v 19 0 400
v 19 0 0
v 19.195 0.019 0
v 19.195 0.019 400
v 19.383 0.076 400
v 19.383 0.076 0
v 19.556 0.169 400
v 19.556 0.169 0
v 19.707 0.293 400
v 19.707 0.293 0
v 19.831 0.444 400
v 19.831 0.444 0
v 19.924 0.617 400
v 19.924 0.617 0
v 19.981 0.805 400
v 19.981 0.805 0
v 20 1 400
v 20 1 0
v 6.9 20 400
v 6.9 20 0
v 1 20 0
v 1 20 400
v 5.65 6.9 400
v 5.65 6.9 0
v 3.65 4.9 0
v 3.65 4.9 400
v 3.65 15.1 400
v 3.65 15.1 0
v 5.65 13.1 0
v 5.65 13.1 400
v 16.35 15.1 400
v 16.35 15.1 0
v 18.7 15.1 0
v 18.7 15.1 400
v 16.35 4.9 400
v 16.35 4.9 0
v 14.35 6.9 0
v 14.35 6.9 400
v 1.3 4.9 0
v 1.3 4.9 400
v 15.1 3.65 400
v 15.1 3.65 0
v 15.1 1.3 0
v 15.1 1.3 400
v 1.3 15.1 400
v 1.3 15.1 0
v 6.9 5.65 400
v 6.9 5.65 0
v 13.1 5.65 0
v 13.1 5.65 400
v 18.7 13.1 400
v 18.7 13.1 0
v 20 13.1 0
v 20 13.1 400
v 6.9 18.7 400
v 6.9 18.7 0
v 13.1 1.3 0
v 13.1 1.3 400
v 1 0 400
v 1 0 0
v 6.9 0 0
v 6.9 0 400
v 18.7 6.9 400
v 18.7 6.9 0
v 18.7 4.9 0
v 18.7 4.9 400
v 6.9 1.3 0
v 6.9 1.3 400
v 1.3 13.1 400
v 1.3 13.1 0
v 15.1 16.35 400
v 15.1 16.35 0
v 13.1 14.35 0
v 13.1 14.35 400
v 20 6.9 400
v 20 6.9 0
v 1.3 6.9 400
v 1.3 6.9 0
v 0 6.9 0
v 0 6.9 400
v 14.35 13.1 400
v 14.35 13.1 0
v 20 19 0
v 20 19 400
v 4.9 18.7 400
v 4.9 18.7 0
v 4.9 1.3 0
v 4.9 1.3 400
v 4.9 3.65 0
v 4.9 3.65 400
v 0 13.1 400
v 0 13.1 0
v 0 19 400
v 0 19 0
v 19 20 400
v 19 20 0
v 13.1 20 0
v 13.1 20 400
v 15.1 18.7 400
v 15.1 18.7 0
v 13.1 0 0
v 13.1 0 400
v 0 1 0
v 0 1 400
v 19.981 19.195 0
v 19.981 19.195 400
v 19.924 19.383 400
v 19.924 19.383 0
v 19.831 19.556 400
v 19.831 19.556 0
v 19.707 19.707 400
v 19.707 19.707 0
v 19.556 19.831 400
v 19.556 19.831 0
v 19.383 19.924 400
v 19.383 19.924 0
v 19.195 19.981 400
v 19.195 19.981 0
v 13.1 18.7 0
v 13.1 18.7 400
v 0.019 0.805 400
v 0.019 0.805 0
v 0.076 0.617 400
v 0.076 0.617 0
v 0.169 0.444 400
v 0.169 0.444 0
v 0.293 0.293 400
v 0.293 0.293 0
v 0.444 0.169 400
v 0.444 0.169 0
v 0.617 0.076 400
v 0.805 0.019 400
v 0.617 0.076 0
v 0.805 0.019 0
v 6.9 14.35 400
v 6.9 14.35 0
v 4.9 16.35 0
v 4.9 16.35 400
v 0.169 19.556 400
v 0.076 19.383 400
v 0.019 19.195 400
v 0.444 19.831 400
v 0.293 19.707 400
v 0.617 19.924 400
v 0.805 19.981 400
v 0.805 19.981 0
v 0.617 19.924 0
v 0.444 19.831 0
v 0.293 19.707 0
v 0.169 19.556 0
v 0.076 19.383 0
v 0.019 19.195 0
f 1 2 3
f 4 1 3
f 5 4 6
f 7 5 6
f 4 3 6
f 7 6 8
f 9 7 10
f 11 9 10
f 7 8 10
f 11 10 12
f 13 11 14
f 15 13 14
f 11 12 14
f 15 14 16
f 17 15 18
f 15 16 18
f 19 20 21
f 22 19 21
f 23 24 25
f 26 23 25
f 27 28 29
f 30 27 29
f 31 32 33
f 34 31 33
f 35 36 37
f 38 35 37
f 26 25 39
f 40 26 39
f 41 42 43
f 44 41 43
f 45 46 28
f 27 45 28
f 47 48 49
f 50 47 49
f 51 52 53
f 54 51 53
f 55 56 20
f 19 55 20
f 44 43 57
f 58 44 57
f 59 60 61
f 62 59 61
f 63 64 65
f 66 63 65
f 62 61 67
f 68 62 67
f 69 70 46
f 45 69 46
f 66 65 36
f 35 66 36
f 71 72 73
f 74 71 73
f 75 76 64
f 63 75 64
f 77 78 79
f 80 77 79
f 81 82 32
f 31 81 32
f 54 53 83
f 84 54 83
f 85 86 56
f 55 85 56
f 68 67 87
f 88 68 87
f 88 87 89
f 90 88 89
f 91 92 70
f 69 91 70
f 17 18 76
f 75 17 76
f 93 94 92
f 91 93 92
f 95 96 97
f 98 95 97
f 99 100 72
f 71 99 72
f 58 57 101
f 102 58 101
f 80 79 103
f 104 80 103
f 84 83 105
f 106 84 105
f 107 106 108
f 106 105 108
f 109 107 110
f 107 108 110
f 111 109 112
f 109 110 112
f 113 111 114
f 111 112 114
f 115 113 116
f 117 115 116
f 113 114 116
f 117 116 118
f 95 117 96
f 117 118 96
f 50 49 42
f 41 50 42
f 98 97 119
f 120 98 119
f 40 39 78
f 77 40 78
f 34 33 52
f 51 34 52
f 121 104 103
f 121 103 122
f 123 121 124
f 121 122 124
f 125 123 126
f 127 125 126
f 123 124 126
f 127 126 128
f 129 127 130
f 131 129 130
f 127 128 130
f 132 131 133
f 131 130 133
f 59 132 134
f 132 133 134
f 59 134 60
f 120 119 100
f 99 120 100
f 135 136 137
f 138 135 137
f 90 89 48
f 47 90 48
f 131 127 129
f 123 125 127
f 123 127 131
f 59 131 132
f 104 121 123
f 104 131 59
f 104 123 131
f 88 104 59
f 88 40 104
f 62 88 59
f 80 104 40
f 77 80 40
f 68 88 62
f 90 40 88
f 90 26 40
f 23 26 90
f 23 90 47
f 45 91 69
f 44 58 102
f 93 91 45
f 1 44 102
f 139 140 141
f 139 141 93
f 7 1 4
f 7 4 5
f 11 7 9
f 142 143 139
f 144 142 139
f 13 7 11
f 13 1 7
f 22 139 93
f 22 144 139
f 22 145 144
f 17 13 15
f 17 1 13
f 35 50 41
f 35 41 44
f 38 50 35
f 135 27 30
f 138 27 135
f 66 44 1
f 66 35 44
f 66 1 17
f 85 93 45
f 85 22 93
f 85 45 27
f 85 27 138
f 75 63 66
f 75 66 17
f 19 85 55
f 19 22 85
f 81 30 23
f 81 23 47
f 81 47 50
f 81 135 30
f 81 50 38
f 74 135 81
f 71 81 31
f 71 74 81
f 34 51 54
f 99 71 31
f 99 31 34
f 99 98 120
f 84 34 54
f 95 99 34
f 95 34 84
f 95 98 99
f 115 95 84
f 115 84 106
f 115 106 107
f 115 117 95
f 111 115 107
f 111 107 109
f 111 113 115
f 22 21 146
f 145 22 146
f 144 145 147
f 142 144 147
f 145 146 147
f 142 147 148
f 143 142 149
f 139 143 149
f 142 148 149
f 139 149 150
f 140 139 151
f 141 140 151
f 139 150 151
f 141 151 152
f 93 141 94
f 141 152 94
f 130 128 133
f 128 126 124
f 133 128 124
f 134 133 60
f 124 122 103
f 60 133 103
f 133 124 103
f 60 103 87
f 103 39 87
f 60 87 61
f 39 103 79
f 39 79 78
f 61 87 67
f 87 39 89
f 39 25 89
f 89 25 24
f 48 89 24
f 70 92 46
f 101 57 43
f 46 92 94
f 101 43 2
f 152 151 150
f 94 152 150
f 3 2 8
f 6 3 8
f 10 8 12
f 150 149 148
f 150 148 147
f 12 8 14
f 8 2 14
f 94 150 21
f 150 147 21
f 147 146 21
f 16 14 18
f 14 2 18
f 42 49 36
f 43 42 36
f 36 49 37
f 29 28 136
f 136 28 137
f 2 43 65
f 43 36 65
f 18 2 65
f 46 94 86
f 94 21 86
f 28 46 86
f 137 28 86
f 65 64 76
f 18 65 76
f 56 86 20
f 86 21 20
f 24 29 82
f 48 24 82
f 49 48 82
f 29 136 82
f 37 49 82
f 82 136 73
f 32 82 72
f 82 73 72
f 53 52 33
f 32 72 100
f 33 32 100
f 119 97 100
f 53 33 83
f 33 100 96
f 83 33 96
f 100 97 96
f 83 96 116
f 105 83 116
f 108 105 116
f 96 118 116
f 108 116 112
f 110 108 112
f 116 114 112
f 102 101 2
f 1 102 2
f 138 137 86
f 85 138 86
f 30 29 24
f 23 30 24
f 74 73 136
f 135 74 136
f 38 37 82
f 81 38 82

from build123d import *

# Parameters (mm, degrees)
F1_DEPTH = 400


with BuildPart() as f1:
    # F0 (on Top) → F1 (new body)
    with BuildSketch(Plane.XY):
        with BuildLine():
            Line((5.65, 13.1), (5.65, 6.9))
            Line((5.65, 6.9), (3.65, 4.9))
            Line((3.65, 4.9), (1.3, 4.9))
            Line((1.3, 4.9), (1.3, 6.9))
            Line((1.3, 6.9), (0, 6.9))
            Line((0, 6.9), (0, 1))
            ThreePointArc((0, 1), (0.292893, 0.292893), (1, 0))
            Line((1, 0), (6.9, 0))
            Line((6.9, 0), (6.9, 1.3))
            Line((6.9, 1.3), (4.9, 1.3))
            Line((4.9, 1.3), (4.9, 3.65))
            Line((4.9, 3.65), (6.9, 5.65))
            Line((6.9, 5.65), (13.1, 5.65))
            Line((13.1, 5.65), (15.1, 3.65))
            Line((15.1, 3.65), (15.1, 1.3))
            Line((15.1, 1.3), (13.1, 1.3))
            Line((13.1, 1.3), (13.1, 0))
            Line((13.1, 0), (19, 0))
            ThreePointArc((19, 0), (19.707107, 0.292893), (20, 1))
            Line((20, 1), (20, 6.9))
            Line((20, 6.9), (18.7, 6.9))
            Line((18.7, 6.9), (18.7, 4.9))
            Line((18.7, 4.9), (16.35, 4.9))
            Line((16.35, 4.9), (14.35, 6.9))
            Line((14.35, 6.9), (14.35, 13.1))
            Line((14.35, 13.1), (16.35, 15.1))
            Line((16.35, 15.1), (18.7, 15.1))
            Line((18.7, 15.1), (18.7, 13.1))
            Line((18.7, 13.1), (20, 13.1))
            Line((20, 13.1), (20, 19))
            ThreePointArc((20, 19), (19.707107, 19.707107), (19, 20))
            Line((19, 20), (13.1, 20))
            Line((13.1, 20), (13.1, 18.7))
            Line((13.1, 18.7), (15.1, 18.7))
            Line((15.1, 18.7), (15.1, 16.35))
            Line((15.1, 16.35), (13.1, 14.35))
            Line((13.1, 14.35), (6.9, 14.35))
            Line((6.9, 14.35), (4.9, 16.35))
            Line((4.9, 16.35), (4.9, 18.7))
            Line((4.9, 18.7), (6.9, 18.7))
            Line((6.9, 18.7), (6.9, 20))
            Line((6.9, 20), (1, 20))
            ThreePointArc((1, 20), (0.292893, 19.707107), (0, 19))
            Line((0, 19), (0, 13.1))
            Line((0, 13.1), (1.3, 13.1))
            Line((1.3, 13.1), (1.3, 15.1))
            Line((1.3, 15.1), (3.65, 15.1))
            Line((3.65, 15.1), (5.65, 13.1))
        make_face()
    extrude(amount=F1_DEPTH)


solid = f1.part
